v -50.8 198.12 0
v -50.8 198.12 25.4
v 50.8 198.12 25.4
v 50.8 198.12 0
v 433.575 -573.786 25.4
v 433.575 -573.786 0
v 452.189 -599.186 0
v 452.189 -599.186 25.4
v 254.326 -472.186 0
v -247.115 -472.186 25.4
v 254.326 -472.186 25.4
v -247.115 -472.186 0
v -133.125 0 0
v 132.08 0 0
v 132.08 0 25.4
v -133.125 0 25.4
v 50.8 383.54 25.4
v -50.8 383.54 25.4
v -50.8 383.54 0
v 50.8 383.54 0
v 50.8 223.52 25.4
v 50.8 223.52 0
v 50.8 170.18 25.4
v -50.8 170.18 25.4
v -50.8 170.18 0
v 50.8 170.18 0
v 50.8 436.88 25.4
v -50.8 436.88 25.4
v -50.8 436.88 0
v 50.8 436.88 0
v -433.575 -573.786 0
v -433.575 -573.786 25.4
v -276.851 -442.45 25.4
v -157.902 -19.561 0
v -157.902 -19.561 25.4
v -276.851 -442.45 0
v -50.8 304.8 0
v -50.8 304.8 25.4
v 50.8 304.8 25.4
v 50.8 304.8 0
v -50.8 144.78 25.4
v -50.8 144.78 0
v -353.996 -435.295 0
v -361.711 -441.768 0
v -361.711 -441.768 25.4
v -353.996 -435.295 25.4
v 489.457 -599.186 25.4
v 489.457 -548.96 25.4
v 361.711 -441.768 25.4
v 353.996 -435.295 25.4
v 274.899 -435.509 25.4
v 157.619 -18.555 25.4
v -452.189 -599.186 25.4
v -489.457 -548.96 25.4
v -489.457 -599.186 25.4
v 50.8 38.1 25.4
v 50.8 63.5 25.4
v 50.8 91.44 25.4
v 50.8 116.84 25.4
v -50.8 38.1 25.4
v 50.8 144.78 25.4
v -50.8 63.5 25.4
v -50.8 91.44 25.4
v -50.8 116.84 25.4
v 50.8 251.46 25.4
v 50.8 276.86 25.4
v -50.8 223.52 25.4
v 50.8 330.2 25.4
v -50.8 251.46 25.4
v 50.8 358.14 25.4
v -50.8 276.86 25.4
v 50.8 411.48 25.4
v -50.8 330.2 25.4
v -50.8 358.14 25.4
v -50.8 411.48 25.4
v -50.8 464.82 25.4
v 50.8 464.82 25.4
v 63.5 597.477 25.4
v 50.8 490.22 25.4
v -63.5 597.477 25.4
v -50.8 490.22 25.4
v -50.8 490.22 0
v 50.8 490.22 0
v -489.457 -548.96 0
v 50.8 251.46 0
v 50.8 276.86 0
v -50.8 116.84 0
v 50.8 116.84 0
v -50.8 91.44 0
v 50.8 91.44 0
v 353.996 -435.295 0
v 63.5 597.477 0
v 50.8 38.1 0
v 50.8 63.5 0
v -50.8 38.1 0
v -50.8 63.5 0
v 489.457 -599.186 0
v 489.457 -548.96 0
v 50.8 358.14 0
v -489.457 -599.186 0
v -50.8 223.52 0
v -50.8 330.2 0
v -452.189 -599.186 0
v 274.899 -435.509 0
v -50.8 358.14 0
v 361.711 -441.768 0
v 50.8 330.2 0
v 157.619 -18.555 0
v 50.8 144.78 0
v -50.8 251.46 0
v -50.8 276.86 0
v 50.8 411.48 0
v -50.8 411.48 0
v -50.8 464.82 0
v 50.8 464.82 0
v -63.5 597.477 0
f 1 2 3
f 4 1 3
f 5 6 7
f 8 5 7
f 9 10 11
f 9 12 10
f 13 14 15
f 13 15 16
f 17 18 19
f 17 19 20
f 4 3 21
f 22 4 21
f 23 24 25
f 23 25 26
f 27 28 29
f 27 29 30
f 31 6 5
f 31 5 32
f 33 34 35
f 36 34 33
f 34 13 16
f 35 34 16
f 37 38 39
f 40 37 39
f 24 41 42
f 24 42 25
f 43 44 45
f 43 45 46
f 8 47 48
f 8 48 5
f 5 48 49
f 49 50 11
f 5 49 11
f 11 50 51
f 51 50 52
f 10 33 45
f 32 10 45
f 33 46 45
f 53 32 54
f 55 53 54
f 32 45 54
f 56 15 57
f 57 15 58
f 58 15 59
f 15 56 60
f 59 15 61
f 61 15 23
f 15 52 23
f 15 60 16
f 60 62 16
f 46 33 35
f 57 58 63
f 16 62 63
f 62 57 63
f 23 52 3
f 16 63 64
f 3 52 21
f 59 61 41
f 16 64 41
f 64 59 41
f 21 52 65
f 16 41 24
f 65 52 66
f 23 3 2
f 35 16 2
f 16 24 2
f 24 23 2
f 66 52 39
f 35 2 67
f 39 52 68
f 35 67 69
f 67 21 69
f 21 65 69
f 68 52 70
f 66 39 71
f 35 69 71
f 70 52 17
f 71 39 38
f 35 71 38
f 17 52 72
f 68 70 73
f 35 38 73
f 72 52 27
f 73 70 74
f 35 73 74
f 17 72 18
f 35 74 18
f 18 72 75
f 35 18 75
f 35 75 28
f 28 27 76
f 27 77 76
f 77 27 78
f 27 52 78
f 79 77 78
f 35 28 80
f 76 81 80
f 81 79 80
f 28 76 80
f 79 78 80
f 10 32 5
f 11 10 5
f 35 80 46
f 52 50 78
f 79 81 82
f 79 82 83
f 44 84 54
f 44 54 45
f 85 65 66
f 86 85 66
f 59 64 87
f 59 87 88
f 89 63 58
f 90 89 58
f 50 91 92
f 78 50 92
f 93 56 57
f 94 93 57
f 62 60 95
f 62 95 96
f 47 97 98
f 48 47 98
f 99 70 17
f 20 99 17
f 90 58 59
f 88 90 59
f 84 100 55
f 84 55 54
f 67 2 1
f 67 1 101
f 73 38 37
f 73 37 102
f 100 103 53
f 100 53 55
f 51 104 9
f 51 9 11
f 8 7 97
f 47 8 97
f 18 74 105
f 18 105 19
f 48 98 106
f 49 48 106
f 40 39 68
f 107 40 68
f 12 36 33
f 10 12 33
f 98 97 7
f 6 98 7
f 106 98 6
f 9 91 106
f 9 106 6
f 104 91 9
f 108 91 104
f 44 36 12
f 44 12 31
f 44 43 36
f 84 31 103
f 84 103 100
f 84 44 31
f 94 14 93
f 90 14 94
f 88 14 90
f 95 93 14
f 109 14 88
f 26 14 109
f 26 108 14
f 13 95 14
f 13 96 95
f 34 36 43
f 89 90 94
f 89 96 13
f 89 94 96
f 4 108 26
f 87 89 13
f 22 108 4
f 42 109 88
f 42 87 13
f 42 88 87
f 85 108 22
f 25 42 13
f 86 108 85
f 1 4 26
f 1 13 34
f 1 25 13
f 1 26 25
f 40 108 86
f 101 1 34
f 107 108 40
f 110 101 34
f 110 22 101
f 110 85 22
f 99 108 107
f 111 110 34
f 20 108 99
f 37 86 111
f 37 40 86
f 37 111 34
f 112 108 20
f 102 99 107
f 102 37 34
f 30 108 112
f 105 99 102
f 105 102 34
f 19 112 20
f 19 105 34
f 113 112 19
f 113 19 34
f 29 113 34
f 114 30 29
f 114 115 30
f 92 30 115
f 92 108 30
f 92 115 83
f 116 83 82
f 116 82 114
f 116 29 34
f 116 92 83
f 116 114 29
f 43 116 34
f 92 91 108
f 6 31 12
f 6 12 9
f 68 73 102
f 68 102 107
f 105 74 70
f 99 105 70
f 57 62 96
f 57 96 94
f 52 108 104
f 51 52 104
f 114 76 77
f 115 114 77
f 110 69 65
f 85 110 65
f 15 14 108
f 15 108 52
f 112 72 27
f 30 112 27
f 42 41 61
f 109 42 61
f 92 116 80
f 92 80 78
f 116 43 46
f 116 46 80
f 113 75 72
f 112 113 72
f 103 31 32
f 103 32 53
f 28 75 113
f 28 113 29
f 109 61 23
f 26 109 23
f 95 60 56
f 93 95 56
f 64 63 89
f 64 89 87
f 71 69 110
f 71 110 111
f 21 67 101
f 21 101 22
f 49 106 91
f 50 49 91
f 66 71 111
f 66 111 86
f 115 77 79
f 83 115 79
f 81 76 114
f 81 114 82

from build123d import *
from OCP.BRepFilletAPI import BRepFilletAPI_MakeChamfer

# Parameters (mm, degrees)
BOSS_EXTRUDE1_DEPTH = 25.4
CHAMFER1_SIZE       = 38.1
CHAMFER1_SIZE2      = 30.889863159
CHAMFER2_SIZE       = 20.32
CHAMFER2_SIZE2      = 19.275364183
SKETCH2_W           = 101.6
SKETCH2_H           = 25.4
CUT_EXTRUDE2_DEPTH  = 775.10421823
LPATTERN1_COUNT     = 2
LPATTERN1_PITCH     = 106.68


with BuildPart() as part:
    # Sketch1 → Boss-Extrude1 (new body)
    with BuildSketch(Plane.XY):
        Polygon((0, 597.4769356), (0, 0), (152.4, 0), (285.215433829, -472.186), (0, -472.186), (0, -573.786), (415.976251613, -573.786), (433.57458701, -573.786), (452.189239648, -599.186), (469.838640091, -599.186), (489.457166752, -599.186), (489.457166752, -548.960321271), (361.710639116, -441.768257047), (353.995711594, -435.294664209), (63.5, 597.4769356), align=None)
    boss_extrude1 = extrude(amount=BOSS_EXTRUDE1_DEPTH)

    # Mirror1: Boss-Extrude1 across plane
    add(boss_extrude1.mirror(Plane(origin=(0, 0, 25.4), x_dir=(0, 0, 1), z_dir=(1, 0, 0))))

    # Chamfer1: one chamfer whose edges measure the first distance from different faces: ONE call of the kernel's chamfer builder (chamfer() names one face for all edges)
    chamfer1_edges_1 = [part.edges().sort_by_distance(p)[0] for p in [
        (285.215433829, -472.186, 12.7),
    ]]
    chamfer1_side_1 = [part.faces().sort_by_distance(p)[0] for p in [
        (218.807716914, -236.093, 12.7),
    ]]
    chamfer1_edges_2 = [part.edges().sort_by_distance(p)[0] for p in [
        (-285.215433829, -472.186, 12.7),
    ]]
    chamfer1_side_2 = [part.faces().sort_by_distance(p)[0] for p in [
        (0, -472.186, 12.7),
    ]]
    chamfer1 = BRepFilletAPI_MakeChamfer(part.part.solid().wrapped)
    for e in chamfer1_edges_1:
        chamfer1.Add(CHAMFER1_SIZE, CHAMFER1_SIZE2, e.wrapped, chamfer1_side_1[0].wrapped)  # the first distance lies on this face
    for e in chamfer1_edges_2:
        chamfer1.Add(CHAMFER1_SIZE, CHAMFER1_SIZE2, e.wrapped, chamfer1_side_2[0].wrapped)  # the first distance lies on this face
    add(Compound.cast(chamfer1.Shape()), mode=Mode.REPLACE)

    # Chamfer2: one chamfer whose edges measure the first distance from different faces: ONE call of the kernel's chamfer builder (chamfer() names one face for all edges)
    chamfer2_edges_1 = [part.edges().sort_by_distance(p)[0] for p in [
        (152.4, 0, 12.7),
    ]]
    chamfer2_side_1 = [part.faces().sort_by_distance(p)[0] for p in [
        (0, 0, 12.7),
    ]]
    chamfer2_edges_2 = [part.edges().sort_by_distance(p)[0] for p in [
        (-152.4, 0, 12.7),
    ]]
    chamfer2_side_2 = [part.faces().sort_by_distance(p)[0] for p in [
        (-214.625687132, -221.225029782, 12.7),
    ]]
    chamfer2 = BRepFilletAPI_MakeChamfer(part.part.solid().wrapped)
    for e in chamfer2_edges_1:
        chamfer2.Add(CHAMFER2_SIZE, CHAMFER2_SIZE2, e.wrapped, chamfer2_side_1[0].wrapped)  # the first distance lies on this face
    for e in chamfer2_edges_2:
        chamfer2.Add(CHAMFER2_SIZE, CHAMFER2_SIZE2, e.wrapped, chamfer2_side_2[0].wrapped)  # the first distance lies on this face
    add(Compound.cast(chamfer2.Shape()), mode=Mode.REPLACE)

    # Sketch2 → Cut-Extrude2 (cut, through all)
    with BuildSketch(Plane.XY.offset(25.4)):
        with Locations((0, 50.8)):
            Rectangle(SKETCH2_W, SKETCH2_H)
        with Locations((0, 104.14)):
            Rectangle(SKETCH2_W, SKETCH2_H)
        with Locations((0, 157.48)):
            Rectangle(SKETCH2_W, SKETCH2_H)
        with Locations((0, 210.82)):
            Rectangle(SKETCH2_W, SKETCH2_H)
        with Locations((0, 264.16)):
            Rectangle(SKETCH2_W, SKETCH2_H)
        with Locations((0, 317.5)):
            Rectangle(SKETCH2_W, SKETCH2_H)
        with Locations((0, 370.84)):
            Rectangle(SKETCH2_W, SKETCH2_H)
    cut_extrude2 = extrude(amount=-CUT_EXTRUDE2_DEPTH, mode=Mode.SUBTRACT)

    # LPattern1: Cut-Extrude2 ×2
    with Locations(*[(0, i * LPATTERN1_PITCH, 0) for i in range(1, LPATTERN1_COUNT)]):
        add(cut_extrude2, mode=Mode.SUBTRACT)


solid = part.part
